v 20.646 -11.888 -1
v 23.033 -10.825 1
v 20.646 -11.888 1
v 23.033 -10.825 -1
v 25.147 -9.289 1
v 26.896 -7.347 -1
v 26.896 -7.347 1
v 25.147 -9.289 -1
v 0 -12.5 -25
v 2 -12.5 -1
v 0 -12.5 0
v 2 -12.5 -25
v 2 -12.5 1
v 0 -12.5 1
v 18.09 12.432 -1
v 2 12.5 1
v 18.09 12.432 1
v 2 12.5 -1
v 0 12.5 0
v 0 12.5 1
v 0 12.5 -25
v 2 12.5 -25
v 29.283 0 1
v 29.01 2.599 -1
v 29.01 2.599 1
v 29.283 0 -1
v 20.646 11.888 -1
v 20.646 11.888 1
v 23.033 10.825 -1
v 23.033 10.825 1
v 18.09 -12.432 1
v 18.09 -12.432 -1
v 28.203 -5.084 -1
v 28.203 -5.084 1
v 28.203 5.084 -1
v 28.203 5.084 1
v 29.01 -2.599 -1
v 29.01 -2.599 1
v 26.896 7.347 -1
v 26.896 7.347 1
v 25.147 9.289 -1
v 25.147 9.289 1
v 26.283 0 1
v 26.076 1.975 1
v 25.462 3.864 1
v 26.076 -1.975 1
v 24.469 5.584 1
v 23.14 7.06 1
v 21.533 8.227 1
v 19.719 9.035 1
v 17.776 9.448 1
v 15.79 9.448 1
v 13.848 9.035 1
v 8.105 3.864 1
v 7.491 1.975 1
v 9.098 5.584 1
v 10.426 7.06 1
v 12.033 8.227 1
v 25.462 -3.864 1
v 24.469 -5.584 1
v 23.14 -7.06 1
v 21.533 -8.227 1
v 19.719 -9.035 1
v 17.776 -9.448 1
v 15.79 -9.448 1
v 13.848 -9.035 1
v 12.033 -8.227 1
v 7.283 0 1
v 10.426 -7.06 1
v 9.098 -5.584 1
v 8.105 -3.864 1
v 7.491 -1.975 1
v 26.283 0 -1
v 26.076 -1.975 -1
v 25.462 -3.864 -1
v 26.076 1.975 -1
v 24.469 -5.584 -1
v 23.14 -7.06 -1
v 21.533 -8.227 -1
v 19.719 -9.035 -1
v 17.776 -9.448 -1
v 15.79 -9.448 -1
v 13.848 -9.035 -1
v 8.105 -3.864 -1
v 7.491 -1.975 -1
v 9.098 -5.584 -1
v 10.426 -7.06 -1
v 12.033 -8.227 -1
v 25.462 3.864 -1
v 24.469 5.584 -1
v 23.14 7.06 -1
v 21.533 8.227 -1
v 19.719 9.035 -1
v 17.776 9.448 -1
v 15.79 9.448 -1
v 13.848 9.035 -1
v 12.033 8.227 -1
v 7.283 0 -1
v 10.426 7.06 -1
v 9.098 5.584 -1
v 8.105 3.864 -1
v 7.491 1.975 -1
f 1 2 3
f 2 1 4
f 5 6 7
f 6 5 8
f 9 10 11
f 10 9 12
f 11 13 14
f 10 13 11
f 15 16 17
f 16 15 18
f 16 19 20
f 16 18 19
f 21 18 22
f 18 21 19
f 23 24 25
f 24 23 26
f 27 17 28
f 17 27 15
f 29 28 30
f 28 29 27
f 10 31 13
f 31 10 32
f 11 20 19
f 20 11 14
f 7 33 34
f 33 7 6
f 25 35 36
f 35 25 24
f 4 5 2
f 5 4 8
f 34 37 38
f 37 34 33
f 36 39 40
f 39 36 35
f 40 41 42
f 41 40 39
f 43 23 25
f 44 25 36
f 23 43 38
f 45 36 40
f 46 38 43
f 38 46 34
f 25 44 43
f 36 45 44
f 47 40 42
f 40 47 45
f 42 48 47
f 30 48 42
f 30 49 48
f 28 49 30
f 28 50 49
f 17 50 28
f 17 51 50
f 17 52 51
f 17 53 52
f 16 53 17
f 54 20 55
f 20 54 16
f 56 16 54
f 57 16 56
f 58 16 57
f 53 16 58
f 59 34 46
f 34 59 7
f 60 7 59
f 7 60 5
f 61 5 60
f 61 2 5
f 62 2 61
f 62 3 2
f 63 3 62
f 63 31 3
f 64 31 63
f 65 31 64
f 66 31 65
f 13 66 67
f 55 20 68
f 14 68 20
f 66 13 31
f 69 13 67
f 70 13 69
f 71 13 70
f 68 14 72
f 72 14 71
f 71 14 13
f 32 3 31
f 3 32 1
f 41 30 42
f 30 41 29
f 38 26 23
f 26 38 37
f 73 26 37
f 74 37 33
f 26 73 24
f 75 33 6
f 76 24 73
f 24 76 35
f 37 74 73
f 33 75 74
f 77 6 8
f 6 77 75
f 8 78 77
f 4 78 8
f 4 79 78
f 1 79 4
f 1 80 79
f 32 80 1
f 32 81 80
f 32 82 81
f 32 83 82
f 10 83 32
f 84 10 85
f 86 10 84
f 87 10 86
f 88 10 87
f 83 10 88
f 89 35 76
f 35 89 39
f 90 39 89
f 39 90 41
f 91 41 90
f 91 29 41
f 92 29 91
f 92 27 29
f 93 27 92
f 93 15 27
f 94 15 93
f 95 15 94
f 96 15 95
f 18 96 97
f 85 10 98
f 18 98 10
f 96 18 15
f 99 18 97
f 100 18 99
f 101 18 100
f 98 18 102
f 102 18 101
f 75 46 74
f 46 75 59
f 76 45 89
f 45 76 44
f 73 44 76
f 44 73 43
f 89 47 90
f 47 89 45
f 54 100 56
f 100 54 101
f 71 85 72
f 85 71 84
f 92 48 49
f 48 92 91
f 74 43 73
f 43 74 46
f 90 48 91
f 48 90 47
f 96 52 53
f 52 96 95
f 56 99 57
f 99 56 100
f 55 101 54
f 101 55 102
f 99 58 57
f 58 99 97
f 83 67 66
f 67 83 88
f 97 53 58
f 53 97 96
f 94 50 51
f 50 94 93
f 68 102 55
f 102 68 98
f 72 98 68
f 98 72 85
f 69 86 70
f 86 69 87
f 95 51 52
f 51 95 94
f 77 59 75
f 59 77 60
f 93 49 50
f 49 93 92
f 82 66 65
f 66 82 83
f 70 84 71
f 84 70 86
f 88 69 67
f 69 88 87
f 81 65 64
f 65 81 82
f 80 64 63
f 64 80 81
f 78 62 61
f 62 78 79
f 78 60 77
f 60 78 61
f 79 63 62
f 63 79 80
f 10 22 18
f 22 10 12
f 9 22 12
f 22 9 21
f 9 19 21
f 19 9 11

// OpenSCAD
$fn=30;

module holder(d, h, t) {
    translate([d/2+2*PI+h/2, 0, 0])
        difference() {
            hull() {
                cylinder(d=d+t, h=h, center=true);
                translate([-(d/2)-2*PI, 0, 0]) cube([h, d+t, h], center=true);
            }
            cylinder(d=d, h=h+1, center=true);
        }
 
    translate([0, -(d+t)/2, -25]) cube([h, d+t, 25]);
}

holder(19, 2, 6);
